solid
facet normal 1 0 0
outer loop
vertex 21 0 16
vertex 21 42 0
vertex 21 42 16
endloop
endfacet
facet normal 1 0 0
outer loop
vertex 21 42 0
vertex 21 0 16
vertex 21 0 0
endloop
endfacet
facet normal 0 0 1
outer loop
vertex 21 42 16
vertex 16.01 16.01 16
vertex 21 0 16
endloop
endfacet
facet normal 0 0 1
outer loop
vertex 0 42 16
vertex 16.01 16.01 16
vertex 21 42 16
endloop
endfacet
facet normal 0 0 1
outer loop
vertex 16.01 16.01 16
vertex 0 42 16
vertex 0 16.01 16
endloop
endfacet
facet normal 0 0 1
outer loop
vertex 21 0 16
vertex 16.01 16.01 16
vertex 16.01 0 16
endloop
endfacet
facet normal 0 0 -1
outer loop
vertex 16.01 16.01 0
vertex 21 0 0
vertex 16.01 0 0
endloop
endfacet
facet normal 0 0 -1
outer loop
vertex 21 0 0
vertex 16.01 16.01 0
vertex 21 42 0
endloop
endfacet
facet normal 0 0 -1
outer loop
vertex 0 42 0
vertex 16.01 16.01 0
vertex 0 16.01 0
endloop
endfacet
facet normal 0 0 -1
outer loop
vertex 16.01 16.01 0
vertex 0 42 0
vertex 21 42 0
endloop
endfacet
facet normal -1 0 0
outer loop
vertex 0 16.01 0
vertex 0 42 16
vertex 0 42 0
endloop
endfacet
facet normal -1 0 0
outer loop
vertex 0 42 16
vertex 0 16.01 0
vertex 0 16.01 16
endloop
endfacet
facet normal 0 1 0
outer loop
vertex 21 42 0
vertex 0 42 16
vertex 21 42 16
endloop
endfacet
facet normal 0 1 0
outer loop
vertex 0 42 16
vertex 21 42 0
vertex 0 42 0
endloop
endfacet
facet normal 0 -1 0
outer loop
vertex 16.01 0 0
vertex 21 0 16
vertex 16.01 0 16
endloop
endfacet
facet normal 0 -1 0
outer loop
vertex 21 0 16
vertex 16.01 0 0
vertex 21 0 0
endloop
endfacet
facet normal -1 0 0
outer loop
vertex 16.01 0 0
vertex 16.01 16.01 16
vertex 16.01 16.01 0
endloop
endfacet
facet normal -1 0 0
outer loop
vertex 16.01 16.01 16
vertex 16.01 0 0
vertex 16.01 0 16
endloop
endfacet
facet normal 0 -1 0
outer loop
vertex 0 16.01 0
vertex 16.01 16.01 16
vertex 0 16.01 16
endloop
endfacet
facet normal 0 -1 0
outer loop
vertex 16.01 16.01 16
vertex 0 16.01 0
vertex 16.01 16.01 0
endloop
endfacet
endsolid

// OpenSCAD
//TPU parts to stabilize the shelf
//Project: Kauzerei Werkstatt

part="corner";//[gauge,corner]
start=8;
step=1;
end=14;
gauge_depth=5;
gauge_width=8;
width=16;
depth=26;
thickness=5;
bissl=1/100;

if (part=="gauge") {
  for(index=[0:(end-start)/step]) {
    cube([end-index*step,gauge_depth*(index+1),gauge_width]);
  }
}

if (part=="corner") {
  difference() {
    cube([width+thickness,width+depth,width]);
    translate([-bissl,-bissl,-bissl])cube([width+2*bissl,width+2*bissl,width+2*bissl]);
  }
}
